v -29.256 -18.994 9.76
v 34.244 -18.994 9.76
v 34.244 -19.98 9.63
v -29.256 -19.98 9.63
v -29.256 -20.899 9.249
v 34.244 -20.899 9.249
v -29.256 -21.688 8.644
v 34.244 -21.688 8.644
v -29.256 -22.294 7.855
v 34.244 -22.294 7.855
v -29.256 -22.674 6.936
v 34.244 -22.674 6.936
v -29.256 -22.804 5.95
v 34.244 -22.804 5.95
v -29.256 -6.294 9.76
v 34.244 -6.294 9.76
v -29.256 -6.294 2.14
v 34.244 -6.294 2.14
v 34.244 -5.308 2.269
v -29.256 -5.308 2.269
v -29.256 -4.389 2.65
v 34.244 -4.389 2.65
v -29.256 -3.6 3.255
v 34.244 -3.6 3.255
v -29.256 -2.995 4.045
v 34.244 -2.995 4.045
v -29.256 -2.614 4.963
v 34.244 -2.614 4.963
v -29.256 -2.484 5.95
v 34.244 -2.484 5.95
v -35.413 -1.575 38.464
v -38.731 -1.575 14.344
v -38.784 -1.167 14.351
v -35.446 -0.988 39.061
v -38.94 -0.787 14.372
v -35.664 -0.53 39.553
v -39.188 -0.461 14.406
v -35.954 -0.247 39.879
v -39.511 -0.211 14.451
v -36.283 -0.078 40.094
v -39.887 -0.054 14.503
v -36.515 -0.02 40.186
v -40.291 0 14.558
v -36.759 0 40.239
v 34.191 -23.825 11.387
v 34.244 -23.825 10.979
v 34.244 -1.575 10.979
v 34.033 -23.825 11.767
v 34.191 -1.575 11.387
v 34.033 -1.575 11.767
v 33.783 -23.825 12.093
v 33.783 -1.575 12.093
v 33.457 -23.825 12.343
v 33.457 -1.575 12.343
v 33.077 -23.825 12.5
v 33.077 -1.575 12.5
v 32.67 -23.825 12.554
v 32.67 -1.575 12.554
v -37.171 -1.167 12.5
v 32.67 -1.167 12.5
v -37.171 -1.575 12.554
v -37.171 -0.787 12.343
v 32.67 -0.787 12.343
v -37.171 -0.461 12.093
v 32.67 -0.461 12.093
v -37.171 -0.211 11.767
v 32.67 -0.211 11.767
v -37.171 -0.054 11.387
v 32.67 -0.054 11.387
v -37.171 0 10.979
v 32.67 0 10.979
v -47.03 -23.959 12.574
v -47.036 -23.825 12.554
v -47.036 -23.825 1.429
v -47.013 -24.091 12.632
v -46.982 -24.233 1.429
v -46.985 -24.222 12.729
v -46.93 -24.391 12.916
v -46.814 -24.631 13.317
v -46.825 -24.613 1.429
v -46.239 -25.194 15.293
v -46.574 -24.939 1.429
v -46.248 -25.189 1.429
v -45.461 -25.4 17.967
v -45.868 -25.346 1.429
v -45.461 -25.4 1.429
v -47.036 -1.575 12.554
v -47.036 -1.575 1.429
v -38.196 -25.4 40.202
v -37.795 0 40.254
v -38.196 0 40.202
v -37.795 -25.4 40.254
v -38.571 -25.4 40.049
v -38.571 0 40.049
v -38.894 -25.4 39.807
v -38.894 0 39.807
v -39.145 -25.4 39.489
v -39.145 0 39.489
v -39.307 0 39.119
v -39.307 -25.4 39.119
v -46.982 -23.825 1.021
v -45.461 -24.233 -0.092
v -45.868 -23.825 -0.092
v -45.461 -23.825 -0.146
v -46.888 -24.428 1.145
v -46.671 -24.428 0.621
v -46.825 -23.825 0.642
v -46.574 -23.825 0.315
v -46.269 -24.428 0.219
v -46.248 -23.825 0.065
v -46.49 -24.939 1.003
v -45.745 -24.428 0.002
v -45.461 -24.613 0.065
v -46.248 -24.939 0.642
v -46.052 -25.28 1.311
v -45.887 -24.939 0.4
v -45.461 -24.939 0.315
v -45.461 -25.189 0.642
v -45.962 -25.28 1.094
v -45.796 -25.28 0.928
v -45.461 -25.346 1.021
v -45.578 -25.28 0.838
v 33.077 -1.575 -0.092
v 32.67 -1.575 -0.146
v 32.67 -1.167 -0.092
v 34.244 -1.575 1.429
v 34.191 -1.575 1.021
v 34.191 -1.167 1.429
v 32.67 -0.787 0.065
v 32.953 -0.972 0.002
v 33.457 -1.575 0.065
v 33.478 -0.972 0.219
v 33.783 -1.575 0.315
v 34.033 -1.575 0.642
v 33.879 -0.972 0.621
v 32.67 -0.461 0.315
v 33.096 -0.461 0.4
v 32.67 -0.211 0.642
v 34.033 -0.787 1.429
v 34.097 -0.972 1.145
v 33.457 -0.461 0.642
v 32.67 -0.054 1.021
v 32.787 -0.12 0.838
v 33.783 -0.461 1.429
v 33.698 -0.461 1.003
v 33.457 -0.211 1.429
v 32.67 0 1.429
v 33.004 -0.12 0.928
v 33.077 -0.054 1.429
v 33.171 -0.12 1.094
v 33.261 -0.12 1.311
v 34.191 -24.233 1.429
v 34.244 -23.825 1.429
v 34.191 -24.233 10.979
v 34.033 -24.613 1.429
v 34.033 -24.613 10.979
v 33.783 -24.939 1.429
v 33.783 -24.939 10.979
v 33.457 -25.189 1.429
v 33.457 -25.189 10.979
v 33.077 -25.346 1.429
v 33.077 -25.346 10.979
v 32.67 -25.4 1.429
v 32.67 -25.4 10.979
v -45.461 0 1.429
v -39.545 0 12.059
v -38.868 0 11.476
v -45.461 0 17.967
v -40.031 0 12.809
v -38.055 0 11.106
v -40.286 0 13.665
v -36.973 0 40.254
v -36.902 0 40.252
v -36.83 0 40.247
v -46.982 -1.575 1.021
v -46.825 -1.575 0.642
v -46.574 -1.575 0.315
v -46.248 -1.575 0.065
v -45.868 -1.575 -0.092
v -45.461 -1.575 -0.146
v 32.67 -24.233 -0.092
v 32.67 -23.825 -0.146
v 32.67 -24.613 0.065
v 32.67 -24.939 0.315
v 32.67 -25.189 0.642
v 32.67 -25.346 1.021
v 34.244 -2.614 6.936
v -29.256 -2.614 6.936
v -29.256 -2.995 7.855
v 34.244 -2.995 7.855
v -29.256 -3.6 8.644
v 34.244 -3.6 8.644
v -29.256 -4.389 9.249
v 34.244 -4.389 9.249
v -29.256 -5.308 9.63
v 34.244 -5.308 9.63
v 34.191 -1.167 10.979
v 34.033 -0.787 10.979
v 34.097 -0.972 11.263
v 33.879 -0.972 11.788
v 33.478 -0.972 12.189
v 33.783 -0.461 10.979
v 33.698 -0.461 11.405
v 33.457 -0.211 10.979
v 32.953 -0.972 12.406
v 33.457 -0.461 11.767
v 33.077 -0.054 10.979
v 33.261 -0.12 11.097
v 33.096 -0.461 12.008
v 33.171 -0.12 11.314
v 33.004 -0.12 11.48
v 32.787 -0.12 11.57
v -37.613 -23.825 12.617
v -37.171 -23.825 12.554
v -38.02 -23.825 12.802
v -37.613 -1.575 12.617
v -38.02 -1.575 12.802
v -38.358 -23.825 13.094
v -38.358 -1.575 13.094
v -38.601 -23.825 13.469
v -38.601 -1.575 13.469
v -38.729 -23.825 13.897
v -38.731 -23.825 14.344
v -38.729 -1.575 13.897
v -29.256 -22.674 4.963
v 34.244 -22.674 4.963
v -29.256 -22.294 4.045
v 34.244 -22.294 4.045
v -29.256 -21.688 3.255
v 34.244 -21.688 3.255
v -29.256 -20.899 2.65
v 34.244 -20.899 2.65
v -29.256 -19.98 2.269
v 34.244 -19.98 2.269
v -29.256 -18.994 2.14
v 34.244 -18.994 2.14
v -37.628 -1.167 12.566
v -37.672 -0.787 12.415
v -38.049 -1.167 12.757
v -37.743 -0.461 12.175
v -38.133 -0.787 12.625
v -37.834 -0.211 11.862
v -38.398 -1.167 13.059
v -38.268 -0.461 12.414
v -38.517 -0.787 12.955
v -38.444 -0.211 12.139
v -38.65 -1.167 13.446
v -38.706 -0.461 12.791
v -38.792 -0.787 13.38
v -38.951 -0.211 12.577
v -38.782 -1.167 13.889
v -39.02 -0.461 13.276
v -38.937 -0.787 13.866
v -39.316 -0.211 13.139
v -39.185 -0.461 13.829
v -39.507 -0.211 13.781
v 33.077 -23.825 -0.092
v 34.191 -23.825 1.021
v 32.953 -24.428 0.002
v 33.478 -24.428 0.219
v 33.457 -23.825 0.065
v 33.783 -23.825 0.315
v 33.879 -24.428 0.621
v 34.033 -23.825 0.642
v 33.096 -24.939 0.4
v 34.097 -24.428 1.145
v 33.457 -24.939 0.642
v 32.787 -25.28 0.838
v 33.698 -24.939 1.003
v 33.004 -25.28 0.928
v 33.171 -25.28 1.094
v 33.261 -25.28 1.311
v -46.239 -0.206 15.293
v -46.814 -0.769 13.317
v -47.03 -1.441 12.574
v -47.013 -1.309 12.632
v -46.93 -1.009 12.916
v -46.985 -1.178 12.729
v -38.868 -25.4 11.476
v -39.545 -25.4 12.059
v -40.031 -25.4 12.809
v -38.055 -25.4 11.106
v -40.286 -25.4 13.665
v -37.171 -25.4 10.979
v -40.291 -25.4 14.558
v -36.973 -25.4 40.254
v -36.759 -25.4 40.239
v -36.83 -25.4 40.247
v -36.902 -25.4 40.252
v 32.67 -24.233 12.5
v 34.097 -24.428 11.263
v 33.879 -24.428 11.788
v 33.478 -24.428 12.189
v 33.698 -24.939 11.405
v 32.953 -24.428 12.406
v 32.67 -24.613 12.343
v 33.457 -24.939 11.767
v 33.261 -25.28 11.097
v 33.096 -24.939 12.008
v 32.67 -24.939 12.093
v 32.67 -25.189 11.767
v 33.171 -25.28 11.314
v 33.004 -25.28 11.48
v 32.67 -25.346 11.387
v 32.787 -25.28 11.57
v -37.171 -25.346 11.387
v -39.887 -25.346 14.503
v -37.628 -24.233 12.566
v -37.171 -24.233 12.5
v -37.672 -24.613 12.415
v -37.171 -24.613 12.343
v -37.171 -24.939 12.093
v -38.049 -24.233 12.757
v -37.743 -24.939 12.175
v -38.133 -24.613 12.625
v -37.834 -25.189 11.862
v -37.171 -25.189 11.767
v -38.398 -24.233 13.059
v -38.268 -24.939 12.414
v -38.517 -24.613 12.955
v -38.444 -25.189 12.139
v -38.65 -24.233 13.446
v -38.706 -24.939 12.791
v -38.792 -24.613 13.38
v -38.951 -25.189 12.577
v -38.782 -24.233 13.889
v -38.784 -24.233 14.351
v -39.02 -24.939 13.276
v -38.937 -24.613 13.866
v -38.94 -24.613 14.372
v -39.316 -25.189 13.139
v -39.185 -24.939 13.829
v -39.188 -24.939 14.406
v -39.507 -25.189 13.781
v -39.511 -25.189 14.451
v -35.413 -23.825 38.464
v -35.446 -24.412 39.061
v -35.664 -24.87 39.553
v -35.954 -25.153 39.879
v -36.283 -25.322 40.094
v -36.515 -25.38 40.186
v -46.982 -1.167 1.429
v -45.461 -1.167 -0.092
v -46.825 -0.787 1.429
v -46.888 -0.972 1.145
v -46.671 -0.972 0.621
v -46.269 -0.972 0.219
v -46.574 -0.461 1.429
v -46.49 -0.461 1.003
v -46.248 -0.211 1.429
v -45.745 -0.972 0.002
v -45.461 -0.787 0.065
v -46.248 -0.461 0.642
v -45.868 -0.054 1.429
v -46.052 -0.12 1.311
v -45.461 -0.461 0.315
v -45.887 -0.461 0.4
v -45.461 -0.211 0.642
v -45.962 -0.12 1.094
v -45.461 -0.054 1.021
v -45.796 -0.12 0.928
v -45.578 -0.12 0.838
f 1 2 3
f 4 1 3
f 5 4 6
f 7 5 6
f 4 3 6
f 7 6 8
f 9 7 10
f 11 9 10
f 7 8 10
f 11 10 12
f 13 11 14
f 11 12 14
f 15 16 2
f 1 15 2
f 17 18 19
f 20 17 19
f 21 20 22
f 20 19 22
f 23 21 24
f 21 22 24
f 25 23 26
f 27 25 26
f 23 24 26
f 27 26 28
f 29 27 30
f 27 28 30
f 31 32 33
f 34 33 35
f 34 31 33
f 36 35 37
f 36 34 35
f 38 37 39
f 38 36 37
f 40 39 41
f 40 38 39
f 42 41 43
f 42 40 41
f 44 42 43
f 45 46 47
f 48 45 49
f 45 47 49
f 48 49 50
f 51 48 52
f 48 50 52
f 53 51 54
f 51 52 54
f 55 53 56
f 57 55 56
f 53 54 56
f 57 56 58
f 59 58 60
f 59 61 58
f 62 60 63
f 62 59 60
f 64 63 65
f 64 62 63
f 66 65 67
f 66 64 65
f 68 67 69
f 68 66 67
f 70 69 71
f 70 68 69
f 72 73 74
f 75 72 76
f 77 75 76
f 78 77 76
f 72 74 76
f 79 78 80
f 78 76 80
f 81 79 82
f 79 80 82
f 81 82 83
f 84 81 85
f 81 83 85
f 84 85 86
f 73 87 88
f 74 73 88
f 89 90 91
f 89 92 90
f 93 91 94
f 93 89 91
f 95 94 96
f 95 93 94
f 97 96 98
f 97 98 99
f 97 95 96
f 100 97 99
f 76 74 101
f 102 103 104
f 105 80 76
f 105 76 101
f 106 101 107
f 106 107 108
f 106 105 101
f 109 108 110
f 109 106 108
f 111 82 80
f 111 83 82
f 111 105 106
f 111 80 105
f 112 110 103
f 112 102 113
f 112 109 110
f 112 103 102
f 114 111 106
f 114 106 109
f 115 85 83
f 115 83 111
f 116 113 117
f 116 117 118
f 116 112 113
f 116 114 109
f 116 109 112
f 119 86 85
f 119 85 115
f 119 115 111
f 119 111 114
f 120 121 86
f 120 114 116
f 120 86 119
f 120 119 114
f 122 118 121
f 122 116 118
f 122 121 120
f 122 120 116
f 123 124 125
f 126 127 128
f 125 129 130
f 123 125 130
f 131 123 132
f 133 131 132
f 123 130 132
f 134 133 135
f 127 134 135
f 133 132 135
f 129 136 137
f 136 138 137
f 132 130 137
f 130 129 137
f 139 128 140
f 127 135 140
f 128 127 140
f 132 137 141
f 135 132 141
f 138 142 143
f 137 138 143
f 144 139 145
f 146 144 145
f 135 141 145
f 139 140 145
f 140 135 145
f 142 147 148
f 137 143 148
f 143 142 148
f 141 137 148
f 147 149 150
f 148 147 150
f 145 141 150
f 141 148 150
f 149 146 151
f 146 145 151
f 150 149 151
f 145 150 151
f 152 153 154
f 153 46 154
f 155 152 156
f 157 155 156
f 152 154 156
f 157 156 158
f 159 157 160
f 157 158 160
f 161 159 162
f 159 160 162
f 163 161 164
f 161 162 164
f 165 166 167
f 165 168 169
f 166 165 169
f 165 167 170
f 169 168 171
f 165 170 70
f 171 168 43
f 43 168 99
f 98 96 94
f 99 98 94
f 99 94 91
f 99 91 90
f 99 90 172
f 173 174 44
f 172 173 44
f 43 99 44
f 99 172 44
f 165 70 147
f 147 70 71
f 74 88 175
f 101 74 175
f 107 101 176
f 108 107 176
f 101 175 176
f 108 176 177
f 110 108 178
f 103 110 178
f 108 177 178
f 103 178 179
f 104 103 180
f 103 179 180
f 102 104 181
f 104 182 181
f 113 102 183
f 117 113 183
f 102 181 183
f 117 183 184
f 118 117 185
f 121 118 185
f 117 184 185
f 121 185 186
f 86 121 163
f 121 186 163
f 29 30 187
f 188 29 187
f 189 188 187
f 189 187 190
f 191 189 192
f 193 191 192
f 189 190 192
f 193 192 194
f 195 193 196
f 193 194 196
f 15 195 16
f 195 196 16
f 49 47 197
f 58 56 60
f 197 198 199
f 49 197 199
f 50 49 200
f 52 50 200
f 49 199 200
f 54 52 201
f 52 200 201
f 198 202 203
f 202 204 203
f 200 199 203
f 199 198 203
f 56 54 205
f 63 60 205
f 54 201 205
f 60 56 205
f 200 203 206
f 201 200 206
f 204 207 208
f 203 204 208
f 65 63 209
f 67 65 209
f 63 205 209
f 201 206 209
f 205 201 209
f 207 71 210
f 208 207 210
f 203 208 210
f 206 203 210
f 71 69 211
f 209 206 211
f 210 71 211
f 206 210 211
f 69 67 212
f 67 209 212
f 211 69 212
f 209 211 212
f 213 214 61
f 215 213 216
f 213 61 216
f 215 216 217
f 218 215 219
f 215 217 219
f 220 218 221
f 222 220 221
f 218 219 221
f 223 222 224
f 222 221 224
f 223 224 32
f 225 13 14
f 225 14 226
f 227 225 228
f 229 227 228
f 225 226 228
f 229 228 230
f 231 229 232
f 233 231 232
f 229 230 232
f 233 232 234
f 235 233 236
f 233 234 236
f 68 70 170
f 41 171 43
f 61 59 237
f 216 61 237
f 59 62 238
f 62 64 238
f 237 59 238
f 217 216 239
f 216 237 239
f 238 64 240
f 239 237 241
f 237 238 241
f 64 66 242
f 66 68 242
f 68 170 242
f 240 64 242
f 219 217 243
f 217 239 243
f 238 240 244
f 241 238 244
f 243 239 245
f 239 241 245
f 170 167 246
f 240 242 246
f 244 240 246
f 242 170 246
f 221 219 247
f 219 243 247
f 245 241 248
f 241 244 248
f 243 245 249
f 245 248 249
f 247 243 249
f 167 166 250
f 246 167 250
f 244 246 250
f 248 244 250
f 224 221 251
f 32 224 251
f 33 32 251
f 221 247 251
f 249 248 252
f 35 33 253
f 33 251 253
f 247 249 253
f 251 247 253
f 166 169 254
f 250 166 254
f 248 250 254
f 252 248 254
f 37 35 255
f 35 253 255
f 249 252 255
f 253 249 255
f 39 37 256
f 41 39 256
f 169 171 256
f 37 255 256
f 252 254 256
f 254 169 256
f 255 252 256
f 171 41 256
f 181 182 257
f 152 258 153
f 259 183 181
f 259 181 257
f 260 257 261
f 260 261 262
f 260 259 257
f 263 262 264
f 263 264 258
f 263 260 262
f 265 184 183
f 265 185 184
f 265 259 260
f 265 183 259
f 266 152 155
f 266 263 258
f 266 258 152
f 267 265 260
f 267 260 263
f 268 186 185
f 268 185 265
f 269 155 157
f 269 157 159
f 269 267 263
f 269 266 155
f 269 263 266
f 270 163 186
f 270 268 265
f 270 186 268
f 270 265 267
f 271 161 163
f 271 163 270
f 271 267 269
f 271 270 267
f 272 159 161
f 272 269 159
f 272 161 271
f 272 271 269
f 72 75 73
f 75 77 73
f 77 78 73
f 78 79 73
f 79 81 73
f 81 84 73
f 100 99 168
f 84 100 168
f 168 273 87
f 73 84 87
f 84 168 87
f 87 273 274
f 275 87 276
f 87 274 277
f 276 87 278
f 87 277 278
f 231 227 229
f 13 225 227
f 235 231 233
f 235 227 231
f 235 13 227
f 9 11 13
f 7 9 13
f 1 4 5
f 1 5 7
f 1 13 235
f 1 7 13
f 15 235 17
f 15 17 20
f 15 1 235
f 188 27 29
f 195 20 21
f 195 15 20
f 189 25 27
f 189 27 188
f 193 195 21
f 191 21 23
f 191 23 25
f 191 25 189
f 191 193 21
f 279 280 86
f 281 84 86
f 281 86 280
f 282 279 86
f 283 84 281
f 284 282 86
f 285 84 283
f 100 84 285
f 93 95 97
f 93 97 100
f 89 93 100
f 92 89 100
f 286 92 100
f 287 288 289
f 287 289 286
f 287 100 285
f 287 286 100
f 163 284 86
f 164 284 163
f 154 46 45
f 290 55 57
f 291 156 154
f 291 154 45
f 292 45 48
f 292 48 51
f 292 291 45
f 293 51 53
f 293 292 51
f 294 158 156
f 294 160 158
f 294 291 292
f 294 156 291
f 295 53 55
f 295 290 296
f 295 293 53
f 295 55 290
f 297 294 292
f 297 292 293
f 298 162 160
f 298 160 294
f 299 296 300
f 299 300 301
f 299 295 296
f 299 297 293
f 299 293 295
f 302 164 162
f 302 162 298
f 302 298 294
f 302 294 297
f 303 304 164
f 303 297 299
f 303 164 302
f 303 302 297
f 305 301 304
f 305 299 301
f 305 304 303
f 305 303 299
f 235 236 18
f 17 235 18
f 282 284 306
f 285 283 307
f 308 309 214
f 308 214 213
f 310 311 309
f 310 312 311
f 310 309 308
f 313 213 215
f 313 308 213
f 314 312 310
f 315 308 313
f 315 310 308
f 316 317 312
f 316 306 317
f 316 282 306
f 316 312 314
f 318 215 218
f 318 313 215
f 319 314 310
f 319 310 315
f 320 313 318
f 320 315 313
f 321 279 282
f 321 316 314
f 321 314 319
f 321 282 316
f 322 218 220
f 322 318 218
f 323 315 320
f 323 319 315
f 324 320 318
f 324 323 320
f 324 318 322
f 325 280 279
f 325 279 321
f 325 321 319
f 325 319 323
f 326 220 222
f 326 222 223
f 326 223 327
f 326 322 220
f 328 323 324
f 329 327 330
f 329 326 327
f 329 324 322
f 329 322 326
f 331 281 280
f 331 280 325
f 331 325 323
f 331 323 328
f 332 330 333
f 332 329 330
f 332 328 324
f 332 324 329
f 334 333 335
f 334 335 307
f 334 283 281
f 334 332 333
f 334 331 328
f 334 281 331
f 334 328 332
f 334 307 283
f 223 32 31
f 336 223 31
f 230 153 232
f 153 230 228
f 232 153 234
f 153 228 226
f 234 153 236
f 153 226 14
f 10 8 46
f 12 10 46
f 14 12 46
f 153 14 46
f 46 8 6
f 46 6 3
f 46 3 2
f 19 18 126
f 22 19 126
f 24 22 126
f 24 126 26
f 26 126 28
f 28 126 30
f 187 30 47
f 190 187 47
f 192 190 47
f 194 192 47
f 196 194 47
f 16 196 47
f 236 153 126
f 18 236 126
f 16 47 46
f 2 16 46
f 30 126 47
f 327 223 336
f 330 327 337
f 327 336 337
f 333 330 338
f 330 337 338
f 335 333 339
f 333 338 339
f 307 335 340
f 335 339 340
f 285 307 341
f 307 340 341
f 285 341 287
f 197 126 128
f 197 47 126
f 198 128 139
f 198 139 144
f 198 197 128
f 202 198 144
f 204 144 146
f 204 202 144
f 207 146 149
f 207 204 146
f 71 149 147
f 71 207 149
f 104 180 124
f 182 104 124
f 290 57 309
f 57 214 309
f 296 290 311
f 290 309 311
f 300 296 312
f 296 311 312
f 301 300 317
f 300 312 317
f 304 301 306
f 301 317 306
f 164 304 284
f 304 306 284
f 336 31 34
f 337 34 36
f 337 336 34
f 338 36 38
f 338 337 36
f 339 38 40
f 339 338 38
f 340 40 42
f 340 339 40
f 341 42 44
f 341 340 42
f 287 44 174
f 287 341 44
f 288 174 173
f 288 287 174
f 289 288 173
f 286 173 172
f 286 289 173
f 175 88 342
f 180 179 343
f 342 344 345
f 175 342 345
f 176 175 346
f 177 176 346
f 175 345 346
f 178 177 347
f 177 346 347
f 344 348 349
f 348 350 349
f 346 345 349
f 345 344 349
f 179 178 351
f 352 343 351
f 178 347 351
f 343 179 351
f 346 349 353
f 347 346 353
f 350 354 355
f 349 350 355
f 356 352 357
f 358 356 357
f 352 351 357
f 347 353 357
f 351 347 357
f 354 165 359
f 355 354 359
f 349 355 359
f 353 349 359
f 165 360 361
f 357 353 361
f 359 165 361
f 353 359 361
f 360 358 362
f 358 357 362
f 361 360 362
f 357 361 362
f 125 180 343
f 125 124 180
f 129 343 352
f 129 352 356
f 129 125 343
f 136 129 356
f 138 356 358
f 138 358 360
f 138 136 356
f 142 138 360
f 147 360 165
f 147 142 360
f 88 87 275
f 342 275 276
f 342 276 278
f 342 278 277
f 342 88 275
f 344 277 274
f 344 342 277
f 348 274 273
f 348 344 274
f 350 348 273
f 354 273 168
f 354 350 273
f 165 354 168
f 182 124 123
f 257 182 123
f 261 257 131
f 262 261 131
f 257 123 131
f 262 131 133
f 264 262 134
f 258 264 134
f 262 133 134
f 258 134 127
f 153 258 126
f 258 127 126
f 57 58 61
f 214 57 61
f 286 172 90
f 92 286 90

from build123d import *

# Parameters (mm, degrees)
F1_DEPTH = 25.4
F2_R     = 1.5748
F4_DEPTH = 63.5


with BuildPart() as f1:
    # F0 (on Front) → F1 (new body)
    with BuildSketch(Plane.XZ):
        with BuildLine():
            Line((-45.4608029084, -0.1458625454), (32.6695970916, -0.1458625454))
            ThreePointArc((32.6695970916, -0.1458625454), (33.7831488506, 0.3153856956), (34.2443970916, 1.4289374546))
            Line((34.2443970916, 1.4289374546), (34.2443970916, 10.9793374546))
            ThreePointArc((34.2443970916, 10.9793374546), (33.7831488506, 12.0928892136), (32.6695970916, 12.5541374546))
            Line((32.6695970916, 12.5541374546), (-37.1709763854, 12.5541374546))
            ThreePointArc((-37.1709763854, 12.5541374546), (-38.357974904, 13.0940318759), (-38.7310873695, 14.3435271969))
            Line((-38.7310873695, 14.3435271969), (-35.1672138872, 40.2536108012))
            Line((-35.1672138872, 40.2536108012), (-38.9772138872, 40.2536108012))
            Line((-38.9772138872, 40.2536108012), (-47.0356029084, 12.5541374546))
            Line((-47.0356029084, 12.5541374546), (-47.0356029084, 1.4289374546))
            ThreePointArc((-47.0356029084, 1.4289374546), (-46.5743546674, 0.3153856956), (-45.4608029084, -0.1458625454))
        make_face()
    extrude(amount=F1_DEPTH)

    # F2
    f2_edges = [f1.edges().sort_by_distance(p)[0] for p in [
        (-2.25069, -25.4, 12.554137),
        (-2.25069, 0, 12.554137),
        (-35.167214, -12.7, 40.253611),
        (-38.977214, -12.7, 40.253611),
    ]]
    fillet(f2_edges, radius=F2_R)

    # F3 (on face) → F4 (cut)
    with BuildSketch(Plane.YZ.offset(34.2443970916)):
        with BuildLine():
            ThreePointArc((-2.4841372558, 5.9495763853), (-3.6000604195, 8.6436532216), (-6.2941372558, 9.7595763853))
            Line((-6.2941372558, 9.7595763853), (-18.9941372558, 9.7595763853))
            ThreePointArc((-18.9941372558, 9.7595763853), (-21.6882140922, 8.6436532216), (-22.8041372558, 5.9495763853))
            ThreePointArc((-22.8041372558, 5.9495763853), (-21.6882140922, 3.255499549), (-18.9941372558, 2.1395763853))
            Line((-18.9941372558, 2.1395763853), (-6.2941372558, 2.1395763853))
            ThreePointArc((-6.2941372558, 2.1395763853), (-3.6000604195, 3.255499549), (-2.4841372558, 5.9495763853))
        make_face()
    extrude(amount=-F4_DEPTH, mode=Mode.SUBTRACT)


solid = f1.part
